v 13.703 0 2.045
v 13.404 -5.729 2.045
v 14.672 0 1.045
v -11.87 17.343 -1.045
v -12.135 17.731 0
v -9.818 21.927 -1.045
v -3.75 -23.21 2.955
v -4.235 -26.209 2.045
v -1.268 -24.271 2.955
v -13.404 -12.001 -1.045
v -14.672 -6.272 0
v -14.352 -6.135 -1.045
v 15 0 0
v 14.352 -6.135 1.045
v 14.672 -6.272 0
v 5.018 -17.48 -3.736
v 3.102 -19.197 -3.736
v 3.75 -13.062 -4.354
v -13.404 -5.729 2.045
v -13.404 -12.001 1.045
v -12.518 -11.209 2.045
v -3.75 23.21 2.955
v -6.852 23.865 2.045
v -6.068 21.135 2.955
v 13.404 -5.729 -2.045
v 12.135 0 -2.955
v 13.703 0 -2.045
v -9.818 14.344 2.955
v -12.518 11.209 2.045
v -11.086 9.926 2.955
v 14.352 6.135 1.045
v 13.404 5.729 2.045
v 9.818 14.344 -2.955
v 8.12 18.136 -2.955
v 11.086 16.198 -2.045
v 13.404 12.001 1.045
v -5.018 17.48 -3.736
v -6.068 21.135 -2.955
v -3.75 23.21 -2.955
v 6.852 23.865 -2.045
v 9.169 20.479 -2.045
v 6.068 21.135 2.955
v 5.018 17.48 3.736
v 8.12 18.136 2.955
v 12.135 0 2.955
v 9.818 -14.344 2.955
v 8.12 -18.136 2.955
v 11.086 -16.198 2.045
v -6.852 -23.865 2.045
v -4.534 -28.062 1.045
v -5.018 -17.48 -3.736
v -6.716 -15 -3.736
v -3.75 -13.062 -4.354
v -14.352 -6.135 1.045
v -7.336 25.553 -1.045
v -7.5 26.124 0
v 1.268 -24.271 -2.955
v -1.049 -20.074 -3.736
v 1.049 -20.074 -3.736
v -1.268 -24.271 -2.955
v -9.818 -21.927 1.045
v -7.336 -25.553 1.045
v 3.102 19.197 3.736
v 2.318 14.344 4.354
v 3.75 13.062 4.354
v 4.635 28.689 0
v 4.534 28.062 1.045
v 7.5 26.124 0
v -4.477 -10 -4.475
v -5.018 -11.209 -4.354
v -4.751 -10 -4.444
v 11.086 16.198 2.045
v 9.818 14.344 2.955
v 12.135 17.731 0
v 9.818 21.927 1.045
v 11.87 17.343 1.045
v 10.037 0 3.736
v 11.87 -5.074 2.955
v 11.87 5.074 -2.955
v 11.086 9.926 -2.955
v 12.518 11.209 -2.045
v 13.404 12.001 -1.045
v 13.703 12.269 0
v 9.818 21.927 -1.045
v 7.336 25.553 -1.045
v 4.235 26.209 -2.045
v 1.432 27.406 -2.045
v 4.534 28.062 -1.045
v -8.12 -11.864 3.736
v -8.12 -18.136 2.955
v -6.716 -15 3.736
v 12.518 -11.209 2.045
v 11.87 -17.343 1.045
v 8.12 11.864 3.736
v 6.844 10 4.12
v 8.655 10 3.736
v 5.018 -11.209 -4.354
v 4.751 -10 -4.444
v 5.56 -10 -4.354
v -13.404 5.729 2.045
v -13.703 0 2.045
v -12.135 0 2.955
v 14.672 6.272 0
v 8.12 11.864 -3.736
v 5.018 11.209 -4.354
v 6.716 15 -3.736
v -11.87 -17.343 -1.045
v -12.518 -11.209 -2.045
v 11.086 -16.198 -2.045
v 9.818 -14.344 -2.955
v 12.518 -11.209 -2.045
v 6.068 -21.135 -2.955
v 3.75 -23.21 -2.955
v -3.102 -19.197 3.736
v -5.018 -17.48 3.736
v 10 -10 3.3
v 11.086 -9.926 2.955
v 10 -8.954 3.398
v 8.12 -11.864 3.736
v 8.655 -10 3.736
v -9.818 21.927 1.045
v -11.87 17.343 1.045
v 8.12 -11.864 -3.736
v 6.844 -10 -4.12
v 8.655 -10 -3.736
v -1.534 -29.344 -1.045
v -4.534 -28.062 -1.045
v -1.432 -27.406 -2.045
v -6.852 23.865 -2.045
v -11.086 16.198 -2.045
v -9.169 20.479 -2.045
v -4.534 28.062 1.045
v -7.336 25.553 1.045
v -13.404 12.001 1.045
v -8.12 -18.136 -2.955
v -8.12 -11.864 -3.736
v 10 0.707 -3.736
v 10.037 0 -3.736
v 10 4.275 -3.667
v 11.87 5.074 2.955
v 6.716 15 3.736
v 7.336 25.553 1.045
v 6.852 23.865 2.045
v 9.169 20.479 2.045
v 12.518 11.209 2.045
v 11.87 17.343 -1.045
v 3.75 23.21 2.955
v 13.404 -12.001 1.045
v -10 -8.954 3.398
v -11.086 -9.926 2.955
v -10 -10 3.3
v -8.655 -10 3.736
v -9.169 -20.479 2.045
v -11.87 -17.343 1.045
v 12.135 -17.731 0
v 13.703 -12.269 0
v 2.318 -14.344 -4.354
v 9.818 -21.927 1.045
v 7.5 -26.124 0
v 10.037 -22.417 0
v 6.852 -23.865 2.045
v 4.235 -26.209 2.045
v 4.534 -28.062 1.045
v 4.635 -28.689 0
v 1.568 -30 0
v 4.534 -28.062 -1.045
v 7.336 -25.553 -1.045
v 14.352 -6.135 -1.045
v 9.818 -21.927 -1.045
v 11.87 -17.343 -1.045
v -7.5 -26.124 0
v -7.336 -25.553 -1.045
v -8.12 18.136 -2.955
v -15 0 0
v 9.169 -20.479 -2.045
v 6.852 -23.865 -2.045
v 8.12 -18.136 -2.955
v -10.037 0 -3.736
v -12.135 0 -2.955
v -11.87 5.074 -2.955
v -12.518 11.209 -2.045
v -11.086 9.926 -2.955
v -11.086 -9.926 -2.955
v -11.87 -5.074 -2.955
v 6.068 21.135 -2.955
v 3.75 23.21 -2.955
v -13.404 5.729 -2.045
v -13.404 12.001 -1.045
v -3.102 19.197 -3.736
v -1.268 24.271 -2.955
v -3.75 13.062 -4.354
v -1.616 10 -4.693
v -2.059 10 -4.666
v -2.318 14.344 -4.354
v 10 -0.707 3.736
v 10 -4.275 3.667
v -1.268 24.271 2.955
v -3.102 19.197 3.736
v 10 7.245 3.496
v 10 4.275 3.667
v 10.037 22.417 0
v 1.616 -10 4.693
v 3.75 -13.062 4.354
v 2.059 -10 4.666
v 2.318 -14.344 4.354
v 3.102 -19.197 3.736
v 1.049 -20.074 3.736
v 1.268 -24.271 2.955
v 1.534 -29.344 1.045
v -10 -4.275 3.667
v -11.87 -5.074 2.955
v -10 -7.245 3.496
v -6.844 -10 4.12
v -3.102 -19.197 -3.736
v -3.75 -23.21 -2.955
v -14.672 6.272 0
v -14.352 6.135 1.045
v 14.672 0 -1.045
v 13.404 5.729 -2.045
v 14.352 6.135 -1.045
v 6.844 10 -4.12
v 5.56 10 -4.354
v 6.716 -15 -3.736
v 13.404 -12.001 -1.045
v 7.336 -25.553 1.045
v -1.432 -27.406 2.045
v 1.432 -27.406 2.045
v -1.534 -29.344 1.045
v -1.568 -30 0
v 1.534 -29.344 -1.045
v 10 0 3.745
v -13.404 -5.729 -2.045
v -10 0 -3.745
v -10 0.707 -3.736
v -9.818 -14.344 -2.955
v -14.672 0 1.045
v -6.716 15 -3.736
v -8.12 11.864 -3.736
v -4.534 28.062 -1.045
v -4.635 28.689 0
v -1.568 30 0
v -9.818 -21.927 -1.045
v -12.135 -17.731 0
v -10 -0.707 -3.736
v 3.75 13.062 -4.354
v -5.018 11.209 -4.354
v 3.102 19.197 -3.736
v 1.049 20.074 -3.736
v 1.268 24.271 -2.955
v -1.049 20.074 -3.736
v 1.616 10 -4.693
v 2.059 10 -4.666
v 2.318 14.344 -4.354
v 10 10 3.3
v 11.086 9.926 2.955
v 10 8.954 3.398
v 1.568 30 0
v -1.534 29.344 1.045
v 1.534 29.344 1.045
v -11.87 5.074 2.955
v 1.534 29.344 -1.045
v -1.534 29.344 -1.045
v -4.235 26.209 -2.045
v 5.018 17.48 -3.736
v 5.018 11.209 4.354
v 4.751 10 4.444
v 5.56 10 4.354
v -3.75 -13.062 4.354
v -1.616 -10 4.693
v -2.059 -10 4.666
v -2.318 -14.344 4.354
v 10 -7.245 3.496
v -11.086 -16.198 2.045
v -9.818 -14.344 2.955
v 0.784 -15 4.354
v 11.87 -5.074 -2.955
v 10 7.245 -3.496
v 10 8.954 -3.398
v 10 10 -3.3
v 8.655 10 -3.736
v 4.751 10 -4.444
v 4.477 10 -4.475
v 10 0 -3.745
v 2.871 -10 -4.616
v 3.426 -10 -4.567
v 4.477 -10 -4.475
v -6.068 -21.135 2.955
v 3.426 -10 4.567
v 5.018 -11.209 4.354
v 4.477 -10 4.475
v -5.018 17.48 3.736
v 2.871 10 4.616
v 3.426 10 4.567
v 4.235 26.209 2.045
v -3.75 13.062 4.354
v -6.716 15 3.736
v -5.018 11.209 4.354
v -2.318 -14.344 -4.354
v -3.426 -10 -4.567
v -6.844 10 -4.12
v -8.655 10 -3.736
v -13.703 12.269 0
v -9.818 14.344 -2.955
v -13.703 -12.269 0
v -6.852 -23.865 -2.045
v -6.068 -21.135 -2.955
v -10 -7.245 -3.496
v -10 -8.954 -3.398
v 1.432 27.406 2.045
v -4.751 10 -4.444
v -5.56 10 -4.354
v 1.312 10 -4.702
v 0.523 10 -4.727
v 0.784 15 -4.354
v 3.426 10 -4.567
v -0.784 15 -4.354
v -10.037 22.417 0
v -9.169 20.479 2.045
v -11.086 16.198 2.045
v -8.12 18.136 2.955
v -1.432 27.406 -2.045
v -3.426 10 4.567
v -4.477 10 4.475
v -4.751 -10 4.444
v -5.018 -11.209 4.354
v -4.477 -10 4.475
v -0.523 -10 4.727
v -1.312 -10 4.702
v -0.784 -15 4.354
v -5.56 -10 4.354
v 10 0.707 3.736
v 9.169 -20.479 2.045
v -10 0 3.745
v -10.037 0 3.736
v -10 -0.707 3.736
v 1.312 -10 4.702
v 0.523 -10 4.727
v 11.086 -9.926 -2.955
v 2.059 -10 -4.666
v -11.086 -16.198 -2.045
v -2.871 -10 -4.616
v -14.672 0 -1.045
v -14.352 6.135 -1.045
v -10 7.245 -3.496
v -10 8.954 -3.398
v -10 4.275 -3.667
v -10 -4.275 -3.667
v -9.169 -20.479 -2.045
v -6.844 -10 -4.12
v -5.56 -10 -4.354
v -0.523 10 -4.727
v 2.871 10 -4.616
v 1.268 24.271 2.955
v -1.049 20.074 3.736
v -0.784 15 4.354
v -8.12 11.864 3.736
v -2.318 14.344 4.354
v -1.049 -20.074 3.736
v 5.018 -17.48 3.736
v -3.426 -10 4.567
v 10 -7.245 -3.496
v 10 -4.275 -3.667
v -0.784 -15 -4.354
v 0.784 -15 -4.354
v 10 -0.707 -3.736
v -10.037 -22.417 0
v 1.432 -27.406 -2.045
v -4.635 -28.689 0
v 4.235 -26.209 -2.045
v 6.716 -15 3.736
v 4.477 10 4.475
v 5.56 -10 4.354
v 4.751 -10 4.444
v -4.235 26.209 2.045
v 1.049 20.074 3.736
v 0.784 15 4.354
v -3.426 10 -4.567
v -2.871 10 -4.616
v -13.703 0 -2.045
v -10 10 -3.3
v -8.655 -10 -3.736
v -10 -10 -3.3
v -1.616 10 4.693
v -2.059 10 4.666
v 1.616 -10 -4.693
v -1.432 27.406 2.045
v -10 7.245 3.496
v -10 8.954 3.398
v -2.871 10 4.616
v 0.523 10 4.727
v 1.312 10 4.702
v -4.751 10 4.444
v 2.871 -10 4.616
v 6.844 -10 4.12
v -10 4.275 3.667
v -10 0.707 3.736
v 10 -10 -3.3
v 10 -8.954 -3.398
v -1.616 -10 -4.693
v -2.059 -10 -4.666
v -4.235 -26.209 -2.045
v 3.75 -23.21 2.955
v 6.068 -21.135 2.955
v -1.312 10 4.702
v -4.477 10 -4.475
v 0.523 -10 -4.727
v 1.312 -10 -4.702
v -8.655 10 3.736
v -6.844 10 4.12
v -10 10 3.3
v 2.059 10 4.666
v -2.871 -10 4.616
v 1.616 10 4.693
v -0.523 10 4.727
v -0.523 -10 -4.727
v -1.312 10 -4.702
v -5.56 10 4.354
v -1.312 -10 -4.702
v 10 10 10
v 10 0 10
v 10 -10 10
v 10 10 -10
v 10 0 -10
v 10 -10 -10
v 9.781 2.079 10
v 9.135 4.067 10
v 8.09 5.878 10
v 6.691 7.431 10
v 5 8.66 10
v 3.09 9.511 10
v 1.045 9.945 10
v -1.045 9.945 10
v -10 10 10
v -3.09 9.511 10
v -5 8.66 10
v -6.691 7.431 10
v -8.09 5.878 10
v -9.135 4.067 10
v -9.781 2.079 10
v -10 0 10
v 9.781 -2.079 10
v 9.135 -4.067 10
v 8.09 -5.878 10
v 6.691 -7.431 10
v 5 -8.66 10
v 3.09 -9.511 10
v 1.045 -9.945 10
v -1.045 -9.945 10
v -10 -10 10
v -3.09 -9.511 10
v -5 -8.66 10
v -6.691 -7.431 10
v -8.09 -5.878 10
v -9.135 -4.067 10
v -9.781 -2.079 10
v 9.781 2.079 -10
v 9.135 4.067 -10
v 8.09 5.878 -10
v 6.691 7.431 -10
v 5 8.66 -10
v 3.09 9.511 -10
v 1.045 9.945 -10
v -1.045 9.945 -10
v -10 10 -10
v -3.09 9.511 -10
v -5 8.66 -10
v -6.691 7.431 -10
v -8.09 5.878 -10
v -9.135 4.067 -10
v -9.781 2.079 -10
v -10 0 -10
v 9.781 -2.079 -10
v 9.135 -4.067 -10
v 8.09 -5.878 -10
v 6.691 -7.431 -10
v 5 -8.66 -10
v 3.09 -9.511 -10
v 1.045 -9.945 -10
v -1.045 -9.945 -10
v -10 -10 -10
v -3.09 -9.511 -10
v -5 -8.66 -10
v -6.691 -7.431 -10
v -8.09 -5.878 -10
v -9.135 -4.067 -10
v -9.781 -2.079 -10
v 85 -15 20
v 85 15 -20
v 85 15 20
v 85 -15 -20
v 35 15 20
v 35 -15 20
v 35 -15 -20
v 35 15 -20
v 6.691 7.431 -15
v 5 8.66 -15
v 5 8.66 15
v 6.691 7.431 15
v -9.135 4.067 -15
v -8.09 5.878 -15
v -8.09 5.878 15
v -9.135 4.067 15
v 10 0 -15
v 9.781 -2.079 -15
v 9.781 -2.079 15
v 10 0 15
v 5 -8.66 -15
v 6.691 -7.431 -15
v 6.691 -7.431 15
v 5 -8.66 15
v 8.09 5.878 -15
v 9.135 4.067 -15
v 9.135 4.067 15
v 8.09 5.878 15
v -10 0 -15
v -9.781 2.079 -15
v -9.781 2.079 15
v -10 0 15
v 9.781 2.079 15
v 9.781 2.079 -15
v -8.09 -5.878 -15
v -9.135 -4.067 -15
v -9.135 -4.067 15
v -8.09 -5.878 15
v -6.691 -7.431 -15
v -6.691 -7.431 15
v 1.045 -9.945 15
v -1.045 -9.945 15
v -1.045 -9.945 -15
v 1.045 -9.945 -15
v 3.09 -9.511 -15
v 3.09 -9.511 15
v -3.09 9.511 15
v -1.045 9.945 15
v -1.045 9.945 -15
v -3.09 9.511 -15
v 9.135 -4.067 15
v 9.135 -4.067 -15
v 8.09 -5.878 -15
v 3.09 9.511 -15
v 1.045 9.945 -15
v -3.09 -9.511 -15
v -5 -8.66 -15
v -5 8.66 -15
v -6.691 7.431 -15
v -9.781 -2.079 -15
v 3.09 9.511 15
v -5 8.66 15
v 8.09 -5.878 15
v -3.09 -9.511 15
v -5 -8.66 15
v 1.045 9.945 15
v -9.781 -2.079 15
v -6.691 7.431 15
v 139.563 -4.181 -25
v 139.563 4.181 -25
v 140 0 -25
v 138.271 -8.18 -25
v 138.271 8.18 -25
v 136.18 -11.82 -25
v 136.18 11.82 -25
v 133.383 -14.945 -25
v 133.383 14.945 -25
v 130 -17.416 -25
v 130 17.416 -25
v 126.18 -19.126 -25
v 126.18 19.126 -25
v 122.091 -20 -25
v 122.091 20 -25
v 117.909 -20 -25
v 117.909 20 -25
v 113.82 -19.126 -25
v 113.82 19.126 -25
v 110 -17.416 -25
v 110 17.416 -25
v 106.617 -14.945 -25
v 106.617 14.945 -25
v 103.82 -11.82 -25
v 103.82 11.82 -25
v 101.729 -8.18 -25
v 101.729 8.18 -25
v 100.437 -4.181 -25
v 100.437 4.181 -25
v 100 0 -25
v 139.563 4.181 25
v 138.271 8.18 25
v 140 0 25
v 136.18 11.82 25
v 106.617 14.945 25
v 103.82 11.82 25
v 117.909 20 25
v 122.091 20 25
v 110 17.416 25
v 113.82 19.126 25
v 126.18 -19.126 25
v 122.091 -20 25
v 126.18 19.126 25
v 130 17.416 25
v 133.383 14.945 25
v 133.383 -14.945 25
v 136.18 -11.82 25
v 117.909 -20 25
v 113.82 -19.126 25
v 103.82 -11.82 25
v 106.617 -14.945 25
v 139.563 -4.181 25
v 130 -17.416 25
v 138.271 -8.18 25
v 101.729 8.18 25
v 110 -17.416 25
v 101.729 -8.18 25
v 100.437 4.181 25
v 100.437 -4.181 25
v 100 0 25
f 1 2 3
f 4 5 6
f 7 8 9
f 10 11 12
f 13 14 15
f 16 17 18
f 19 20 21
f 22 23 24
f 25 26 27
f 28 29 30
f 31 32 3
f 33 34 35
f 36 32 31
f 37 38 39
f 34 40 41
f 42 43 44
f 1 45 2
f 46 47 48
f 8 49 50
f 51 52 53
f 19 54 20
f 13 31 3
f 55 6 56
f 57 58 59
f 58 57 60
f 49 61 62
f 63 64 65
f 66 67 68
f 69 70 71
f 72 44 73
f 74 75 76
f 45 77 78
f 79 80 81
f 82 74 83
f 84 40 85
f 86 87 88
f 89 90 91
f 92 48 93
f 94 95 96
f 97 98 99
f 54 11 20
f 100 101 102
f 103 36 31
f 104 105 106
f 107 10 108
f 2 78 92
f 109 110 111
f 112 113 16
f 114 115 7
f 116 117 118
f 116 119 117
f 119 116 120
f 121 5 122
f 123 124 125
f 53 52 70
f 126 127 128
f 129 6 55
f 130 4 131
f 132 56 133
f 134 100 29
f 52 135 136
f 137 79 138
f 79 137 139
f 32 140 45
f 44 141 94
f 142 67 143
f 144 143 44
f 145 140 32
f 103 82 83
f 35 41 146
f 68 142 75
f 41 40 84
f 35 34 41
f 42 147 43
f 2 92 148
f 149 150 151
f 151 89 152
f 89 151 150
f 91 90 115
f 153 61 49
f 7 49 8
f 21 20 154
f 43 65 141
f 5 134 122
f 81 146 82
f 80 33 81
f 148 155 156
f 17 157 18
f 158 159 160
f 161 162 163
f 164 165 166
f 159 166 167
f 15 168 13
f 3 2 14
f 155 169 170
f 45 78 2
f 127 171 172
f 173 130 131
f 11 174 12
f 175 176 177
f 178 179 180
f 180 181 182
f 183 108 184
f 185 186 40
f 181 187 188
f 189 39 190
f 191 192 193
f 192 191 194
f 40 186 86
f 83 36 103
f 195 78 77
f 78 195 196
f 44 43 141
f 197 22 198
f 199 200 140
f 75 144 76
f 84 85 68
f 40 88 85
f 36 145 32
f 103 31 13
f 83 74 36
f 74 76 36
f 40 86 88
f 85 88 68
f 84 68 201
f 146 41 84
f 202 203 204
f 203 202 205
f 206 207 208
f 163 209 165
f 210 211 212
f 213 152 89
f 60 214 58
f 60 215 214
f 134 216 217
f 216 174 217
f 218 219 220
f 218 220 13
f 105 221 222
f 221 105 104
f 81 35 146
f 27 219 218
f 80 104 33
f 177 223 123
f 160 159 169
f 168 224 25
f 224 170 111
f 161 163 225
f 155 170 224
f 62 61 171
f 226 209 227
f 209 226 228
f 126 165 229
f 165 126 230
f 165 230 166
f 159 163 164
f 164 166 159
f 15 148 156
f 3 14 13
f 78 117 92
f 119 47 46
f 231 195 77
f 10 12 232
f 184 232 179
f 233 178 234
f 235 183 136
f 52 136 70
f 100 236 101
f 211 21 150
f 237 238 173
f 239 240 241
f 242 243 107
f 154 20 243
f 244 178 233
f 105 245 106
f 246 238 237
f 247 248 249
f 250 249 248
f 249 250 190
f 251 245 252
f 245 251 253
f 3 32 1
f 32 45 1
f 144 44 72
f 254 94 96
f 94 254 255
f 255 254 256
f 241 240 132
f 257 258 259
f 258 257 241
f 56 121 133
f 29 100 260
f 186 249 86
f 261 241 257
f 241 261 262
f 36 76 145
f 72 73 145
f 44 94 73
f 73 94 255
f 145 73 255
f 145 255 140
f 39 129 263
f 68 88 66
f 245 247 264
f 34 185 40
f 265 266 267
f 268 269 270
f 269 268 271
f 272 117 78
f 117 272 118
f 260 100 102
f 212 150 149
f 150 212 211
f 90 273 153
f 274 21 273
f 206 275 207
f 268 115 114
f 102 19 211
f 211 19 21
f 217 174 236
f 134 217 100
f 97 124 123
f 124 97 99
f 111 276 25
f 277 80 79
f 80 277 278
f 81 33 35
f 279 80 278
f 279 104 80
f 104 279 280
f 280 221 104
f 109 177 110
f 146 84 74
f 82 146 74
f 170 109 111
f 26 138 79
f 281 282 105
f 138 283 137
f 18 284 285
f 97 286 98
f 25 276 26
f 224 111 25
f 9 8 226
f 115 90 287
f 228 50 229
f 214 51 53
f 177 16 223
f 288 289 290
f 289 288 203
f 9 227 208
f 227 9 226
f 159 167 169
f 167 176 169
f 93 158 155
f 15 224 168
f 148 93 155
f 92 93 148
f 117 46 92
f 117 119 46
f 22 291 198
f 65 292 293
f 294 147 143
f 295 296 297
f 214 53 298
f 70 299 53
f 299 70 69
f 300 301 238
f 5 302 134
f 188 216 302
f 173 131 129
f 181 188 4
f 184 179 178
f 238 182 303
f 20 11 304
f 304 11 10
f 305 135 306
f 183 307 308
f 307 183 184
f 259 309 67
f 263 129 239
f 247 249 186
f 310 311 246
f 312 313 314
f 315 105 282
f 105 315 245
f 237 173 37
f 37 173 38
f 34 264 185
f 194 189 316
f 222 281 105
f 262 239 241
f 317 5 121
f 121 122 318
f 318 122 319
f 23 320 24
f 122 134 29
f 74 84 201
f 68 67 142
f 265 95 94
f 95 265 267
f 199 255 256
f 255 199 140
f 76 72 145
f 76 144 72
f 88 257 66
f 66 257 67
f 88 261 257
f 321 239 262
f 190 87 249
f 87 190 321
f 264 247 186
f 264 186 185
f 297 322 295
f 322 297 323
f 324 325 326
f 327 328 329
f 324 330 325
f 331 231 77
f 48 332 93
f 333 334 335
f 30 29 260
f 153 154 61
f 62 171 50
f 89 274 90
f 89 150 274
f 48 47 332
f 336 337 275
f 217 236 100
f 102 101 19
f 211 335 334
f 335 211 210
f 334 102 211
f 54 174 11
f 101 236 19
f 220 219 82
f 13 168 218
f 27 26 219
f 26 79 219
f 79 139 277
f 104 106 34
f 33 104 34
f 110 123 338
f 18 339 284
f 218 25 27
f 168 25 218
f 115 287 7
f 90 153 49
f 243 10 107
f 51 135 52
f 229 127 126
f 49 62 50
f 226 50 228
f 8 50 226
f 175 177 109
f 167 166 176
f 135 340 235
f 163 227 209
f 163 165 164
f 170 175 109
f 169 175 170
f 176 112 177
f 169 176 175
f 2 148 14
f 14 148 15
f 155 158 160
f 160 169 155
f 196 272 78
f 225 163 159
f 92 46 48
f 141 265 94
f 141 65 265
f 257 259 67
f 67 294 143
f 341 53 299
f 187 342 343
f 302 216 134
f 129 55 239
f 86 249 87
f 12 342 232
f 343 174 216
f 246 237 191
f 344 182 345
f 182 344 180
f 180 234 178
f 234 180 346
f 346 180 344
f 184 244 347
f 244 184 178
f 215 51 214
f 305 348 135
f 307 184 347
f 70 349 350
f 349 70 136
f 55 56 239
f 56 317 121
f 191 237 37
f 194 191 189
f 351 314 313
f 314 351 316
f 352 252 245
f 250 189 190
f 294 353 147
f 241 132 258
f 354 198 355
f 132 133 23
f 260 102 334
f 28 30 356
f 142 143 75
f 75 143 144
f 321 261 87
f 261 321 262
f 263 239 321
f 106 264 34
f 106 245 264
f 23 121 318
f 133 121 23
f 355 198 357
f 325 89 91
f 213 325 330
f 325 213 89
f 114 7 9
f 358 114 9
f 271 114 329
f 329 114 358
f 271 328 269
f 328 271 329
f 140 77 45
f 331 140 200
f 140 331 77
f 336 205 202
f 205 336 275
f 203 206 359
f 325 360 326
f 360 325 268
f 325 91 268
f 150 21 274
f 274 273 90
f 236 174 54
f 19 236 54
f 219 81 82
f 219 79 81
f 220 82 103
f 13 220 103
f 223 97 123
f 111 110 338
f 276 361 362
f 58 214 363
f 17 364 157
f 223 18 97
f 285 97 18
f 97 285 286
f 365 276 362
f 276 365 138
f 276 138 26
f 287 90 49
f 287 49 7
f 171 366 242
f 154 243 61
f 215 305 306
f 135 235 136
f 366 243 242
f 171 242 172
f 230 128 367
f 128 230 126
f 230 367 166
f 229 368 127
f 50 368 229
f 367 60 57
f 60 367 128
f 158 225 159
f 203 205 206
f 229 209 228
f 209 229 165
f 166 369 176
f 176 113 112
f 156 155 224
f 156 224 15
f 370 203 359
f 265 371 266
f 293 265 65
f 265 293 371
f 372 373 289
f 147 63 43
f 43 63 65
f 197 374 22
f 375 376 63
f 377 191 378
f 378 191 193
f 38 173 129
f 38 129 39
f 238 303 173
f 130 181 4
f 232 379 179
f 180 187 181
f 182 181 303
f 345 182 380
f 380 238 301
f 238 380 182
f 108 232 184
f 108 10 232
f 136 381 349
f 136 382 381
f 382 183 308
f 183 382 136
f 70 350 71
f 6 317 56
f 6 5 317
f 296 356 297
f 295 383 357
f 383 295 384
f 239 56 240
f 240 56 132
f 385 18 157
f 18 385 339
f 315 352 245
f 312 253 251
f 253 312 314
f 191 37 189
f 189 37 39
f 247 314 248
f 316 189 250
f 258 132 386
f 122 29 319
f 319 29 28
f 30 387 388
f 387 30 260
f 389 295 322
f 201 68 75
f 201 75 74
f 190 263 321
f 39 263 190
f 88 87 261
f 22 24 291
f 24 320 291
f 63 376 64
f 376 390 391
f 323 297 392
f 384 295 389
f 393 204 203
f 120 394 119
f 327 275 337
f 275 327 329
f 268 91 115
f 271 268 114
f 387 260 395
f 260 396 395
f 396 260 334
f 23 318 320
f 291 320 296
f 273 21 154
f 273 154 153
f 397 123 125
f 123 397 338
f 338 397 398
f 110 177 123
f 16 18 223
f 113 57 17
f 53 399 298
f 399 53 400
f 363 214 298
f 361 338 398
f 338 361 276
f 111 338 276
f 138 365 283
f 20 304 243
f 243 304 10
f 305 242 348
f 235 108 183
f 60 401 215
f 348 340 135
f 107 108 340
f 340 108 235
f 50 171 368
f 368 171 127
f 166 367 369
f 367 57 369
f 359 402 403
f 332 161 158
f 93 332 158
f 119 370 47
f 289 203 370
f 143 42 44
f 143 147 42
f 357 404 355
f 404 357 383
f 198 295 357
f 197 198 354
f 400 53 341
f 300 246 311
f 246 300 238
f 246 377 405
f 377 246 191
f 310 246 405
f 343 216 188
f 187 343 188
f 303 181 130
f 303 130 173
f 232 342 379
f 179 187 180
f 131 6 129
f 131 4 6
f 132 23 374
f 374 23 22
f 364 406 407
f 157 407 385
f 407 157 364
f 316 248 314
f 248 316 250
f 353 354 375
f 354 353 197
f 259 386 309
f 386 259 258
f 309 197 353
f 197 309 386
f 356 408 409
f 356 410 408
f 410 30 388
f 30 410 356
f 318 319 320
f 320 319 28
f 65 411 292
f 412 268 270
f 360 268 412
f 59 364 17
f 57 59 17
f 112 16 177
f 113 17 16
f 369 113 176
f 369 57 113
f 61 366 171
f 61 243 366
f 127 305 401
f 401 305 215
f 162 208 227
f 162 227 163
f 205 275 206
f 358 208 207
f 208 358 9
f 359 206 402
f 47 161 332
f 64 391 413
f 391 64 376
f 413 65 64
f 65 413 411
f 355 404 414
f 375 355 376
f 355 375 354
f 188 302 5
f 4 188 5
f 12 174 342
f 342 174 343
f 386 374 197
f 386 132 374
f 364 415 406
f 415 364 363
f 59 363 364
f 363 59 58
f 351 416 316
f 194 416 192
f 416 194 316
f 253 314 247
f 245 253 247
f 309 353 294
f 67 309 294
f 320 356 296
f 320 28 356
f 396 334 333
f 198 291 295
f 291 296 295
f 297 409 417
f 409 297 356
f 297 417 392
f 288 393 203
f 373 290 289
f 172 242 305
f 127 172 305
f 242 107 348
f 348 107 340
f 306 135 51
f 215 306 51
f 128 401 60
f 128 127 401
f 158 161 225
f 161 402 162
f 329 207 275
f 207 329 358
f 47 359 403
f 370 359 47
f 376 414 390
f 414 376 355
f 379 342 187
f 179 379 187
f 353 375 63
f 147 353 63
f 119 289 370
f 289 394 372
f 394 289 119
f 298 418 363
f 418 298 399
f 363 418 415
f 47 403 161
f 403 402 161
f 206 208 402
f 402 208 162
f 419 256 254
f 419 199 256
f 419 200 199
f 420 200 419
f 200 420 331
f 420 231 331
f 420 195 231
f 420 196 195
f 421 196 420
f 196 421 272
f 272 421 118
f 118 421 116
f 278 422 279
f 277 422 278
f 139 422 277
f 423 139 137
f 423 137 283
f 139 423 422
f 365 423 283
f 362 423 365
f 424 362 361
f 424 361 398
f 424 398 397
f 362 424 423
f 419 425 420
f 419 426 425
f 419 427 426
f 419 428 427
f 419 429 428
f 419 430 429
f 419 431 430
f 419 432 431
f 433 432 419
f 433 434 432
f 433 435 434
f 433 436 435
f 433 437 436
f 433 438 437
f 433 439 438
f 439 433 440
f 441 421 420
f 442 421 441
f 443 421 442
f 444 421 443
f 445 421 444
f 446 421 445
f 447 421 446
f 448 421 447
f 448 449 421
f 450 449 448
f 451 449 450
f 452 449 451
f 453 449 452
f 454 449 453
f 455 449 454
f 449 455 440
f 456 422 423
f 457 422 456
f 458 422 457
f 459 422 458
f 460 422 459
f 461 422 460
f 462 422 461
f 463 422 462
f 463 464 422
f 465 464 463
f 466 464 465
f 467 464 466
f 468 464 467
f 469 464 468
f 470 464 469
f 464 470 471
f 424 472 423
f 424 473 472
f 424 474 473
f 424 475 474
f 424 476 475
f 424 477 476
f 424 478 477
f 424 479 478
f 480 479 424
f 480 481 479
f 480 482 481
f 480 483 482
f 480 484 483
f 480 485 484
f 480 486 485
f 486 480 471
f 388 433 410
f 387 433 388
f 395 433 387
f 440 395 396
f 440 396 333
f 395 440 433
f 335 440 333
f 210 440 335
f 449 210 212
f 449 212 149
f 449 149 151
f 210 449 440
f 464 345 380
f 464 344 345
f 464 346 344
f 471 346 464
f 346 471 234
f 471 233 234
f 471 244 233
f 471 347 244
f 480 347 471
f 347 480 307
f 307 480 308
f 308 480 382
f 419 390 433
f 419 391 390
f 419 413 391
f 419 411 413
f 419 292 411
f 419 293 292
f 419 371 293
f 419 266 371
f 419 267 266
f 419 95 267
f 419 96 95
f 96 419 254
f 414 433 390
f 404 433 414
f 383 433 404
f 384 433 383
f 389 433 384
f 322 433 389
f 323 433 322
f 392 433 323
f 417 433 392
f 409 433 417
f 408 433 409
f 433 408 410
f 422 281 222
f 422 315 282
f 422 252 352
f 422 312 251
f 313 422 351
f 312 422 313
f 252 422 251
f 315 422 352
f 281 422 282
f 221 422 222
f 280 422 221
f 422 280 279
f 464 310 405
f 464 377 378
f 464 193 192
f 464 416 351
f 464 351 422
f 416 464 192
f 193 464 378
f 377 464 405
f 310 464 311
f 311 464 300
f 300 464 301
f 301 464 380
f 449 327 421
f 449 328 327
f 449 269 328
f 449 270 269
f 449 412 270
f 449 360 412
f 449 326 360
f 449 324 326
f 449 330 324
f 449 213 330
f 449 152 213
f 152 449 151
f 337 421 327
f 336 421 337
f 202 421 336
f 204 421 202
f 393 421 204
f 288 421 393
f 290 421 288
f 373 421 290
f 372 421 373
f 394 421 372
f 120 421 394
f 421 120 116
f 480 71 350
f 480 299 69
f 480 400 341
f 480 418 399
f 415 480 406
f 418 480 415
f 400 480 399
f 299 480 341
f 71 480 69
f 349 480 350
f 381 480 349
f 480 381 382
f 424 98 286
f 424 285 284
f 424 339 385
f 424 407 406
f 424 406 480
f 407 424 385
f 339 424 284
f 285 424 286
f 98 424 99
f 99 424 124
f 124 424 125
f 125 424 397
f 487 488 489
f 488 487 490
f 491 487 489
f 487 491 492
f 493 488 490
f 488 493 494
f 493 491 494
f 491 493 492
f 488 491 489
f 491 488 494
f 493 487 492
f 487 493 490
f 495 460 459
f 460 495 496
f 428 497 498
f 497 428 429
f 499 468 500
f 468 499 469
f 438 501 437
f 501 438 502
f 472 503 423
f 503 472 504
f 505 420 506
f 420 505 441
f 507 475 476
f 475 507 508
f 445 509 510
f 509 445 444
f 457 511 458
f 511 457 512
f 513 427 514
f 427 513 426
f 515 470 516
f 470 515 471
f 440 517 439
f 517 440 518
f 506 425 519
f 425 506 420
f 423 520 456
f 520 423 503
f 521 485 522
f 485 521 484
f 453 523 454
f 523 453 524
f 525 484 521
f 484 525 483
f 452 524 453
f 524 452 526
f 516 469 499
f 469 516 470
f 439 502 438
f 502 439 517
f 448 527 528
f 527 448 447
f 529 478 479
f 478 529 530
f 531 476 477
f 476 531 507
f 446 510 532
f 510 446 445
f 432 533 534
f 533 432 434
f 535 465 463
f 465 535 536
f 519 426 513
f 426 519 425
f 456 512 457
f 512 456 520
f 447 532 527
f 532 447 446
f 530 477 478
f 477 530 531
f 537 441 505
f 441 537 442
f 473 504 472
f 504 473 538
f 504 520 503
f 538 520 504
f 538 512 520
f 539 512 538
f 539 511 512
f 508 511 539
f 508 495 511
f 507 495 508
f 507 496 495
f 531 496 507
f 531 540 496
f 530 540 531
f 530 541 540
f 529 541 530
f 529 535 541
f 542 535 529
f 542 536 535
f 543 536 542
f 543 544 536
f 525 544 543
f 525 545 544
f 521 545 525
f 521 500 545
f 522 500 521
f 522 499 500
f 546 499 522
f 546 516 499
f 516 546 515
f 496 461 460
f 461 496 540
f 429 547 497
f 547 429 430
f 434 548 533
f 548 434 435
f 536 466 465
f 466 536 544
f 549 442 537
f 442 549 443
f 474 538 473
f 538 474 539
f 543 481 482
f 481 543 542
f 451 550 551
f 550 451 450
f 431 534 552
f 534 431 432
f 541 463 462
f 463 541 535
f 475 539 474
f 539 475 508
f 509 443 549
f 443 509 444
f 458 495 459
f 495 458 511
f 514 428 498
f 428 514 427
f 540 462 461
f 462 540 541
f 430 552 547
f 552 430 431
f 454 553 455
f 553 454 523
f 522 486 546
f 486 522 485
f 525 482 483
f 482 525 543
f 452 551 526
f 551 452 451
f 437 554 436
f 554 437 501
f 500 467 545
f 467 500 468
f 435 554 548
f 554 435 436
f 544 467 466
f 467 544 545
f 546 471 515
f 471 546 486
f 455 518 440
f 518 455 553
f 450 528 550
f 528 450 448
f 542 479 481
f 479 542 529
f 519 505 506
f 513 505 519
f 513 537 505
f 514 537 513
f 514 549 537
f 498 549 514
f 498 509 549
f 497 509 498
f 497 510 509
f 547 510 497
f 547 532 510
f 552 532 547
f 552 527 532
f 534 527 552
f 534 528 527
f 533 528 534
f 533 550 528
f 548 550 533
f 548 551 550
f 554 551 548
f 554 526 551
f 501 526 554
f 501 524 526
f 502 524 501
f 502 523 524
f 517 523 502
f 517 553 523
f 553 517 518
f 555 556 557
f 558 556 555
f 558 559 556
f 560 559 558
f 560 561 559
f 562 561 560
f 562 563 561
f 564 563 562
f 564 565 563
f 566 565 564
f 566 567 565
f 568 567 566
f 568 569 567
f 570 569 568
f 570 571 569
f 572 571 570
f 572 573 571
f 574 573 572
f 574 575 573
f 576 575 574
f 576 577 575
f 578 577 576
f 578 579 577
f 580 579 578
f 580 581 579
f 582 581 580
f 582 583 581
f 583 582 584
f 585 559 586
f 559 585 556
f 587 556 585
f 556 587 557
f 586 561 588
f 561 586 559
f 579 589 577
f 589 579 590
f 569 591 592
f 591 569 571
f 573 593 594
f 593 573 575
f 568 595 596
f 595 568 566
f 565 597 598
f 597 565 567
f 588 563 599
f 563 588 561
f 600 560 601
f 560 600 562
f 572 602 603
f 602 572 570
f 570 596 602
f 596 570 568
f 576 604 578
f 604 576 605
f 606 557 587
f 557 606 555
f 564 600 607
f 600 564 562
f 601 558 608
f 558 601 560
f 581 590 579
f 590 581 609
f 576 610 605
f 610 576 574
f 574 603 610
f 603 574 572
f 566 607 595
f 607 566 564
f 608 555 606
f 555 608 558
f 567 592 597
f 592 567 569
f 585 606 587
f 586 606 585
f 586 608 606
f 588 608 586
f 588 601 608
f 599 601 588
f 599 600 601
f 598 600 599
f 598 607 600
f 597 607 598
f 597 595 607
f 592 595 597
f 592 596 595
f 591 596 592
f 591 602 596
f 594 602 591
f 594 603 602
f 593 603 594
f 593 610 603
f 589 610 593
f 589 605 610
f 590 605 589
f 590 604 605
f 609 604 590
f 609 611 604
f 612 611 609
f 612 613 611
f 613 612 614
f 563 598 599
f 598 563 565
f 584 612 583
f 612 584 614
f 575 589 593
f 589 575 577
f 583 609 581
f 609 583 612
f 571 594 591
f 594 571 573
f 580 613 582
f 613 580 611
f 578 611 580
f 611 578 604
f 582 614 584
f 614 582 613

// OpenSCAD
// Example demonstrating the resize() function
// This example shows how to resize a sphere to specific dimensions

// Create a sphere with radius 10mm
sphere(r = 10);

// Resize the sphere to 30mm in X, 60mm in Y, and 10mm in Z
// The original sphere is 20mm in each dimension (diameter = 2*radius)
// After resize, it will be exactly 30x60x10mm
resize(newsize = [30, 60, 10])
    sphere(r = 10);

// You can also resize other objects
// Create a cube of 20x20x20mm
cube(size = 20, center = true);

// Resize the cube to 50x30x40mm
translate([60, 0, 0])
    resize(newsize = [50, 30, 40])
        cube(size = 20, center = true);

// Example with a cylinder
// Cylinder with diameter 20mm and height 30mm
cylinder(d = 20, h = 30, center = true);

// Resize it to 40mm diameter and 50mm height
translate([120, 0, 0])
    resize(newsize = [40, 40, 50])
        cylinder(d = 20, h = 30, center = true);
